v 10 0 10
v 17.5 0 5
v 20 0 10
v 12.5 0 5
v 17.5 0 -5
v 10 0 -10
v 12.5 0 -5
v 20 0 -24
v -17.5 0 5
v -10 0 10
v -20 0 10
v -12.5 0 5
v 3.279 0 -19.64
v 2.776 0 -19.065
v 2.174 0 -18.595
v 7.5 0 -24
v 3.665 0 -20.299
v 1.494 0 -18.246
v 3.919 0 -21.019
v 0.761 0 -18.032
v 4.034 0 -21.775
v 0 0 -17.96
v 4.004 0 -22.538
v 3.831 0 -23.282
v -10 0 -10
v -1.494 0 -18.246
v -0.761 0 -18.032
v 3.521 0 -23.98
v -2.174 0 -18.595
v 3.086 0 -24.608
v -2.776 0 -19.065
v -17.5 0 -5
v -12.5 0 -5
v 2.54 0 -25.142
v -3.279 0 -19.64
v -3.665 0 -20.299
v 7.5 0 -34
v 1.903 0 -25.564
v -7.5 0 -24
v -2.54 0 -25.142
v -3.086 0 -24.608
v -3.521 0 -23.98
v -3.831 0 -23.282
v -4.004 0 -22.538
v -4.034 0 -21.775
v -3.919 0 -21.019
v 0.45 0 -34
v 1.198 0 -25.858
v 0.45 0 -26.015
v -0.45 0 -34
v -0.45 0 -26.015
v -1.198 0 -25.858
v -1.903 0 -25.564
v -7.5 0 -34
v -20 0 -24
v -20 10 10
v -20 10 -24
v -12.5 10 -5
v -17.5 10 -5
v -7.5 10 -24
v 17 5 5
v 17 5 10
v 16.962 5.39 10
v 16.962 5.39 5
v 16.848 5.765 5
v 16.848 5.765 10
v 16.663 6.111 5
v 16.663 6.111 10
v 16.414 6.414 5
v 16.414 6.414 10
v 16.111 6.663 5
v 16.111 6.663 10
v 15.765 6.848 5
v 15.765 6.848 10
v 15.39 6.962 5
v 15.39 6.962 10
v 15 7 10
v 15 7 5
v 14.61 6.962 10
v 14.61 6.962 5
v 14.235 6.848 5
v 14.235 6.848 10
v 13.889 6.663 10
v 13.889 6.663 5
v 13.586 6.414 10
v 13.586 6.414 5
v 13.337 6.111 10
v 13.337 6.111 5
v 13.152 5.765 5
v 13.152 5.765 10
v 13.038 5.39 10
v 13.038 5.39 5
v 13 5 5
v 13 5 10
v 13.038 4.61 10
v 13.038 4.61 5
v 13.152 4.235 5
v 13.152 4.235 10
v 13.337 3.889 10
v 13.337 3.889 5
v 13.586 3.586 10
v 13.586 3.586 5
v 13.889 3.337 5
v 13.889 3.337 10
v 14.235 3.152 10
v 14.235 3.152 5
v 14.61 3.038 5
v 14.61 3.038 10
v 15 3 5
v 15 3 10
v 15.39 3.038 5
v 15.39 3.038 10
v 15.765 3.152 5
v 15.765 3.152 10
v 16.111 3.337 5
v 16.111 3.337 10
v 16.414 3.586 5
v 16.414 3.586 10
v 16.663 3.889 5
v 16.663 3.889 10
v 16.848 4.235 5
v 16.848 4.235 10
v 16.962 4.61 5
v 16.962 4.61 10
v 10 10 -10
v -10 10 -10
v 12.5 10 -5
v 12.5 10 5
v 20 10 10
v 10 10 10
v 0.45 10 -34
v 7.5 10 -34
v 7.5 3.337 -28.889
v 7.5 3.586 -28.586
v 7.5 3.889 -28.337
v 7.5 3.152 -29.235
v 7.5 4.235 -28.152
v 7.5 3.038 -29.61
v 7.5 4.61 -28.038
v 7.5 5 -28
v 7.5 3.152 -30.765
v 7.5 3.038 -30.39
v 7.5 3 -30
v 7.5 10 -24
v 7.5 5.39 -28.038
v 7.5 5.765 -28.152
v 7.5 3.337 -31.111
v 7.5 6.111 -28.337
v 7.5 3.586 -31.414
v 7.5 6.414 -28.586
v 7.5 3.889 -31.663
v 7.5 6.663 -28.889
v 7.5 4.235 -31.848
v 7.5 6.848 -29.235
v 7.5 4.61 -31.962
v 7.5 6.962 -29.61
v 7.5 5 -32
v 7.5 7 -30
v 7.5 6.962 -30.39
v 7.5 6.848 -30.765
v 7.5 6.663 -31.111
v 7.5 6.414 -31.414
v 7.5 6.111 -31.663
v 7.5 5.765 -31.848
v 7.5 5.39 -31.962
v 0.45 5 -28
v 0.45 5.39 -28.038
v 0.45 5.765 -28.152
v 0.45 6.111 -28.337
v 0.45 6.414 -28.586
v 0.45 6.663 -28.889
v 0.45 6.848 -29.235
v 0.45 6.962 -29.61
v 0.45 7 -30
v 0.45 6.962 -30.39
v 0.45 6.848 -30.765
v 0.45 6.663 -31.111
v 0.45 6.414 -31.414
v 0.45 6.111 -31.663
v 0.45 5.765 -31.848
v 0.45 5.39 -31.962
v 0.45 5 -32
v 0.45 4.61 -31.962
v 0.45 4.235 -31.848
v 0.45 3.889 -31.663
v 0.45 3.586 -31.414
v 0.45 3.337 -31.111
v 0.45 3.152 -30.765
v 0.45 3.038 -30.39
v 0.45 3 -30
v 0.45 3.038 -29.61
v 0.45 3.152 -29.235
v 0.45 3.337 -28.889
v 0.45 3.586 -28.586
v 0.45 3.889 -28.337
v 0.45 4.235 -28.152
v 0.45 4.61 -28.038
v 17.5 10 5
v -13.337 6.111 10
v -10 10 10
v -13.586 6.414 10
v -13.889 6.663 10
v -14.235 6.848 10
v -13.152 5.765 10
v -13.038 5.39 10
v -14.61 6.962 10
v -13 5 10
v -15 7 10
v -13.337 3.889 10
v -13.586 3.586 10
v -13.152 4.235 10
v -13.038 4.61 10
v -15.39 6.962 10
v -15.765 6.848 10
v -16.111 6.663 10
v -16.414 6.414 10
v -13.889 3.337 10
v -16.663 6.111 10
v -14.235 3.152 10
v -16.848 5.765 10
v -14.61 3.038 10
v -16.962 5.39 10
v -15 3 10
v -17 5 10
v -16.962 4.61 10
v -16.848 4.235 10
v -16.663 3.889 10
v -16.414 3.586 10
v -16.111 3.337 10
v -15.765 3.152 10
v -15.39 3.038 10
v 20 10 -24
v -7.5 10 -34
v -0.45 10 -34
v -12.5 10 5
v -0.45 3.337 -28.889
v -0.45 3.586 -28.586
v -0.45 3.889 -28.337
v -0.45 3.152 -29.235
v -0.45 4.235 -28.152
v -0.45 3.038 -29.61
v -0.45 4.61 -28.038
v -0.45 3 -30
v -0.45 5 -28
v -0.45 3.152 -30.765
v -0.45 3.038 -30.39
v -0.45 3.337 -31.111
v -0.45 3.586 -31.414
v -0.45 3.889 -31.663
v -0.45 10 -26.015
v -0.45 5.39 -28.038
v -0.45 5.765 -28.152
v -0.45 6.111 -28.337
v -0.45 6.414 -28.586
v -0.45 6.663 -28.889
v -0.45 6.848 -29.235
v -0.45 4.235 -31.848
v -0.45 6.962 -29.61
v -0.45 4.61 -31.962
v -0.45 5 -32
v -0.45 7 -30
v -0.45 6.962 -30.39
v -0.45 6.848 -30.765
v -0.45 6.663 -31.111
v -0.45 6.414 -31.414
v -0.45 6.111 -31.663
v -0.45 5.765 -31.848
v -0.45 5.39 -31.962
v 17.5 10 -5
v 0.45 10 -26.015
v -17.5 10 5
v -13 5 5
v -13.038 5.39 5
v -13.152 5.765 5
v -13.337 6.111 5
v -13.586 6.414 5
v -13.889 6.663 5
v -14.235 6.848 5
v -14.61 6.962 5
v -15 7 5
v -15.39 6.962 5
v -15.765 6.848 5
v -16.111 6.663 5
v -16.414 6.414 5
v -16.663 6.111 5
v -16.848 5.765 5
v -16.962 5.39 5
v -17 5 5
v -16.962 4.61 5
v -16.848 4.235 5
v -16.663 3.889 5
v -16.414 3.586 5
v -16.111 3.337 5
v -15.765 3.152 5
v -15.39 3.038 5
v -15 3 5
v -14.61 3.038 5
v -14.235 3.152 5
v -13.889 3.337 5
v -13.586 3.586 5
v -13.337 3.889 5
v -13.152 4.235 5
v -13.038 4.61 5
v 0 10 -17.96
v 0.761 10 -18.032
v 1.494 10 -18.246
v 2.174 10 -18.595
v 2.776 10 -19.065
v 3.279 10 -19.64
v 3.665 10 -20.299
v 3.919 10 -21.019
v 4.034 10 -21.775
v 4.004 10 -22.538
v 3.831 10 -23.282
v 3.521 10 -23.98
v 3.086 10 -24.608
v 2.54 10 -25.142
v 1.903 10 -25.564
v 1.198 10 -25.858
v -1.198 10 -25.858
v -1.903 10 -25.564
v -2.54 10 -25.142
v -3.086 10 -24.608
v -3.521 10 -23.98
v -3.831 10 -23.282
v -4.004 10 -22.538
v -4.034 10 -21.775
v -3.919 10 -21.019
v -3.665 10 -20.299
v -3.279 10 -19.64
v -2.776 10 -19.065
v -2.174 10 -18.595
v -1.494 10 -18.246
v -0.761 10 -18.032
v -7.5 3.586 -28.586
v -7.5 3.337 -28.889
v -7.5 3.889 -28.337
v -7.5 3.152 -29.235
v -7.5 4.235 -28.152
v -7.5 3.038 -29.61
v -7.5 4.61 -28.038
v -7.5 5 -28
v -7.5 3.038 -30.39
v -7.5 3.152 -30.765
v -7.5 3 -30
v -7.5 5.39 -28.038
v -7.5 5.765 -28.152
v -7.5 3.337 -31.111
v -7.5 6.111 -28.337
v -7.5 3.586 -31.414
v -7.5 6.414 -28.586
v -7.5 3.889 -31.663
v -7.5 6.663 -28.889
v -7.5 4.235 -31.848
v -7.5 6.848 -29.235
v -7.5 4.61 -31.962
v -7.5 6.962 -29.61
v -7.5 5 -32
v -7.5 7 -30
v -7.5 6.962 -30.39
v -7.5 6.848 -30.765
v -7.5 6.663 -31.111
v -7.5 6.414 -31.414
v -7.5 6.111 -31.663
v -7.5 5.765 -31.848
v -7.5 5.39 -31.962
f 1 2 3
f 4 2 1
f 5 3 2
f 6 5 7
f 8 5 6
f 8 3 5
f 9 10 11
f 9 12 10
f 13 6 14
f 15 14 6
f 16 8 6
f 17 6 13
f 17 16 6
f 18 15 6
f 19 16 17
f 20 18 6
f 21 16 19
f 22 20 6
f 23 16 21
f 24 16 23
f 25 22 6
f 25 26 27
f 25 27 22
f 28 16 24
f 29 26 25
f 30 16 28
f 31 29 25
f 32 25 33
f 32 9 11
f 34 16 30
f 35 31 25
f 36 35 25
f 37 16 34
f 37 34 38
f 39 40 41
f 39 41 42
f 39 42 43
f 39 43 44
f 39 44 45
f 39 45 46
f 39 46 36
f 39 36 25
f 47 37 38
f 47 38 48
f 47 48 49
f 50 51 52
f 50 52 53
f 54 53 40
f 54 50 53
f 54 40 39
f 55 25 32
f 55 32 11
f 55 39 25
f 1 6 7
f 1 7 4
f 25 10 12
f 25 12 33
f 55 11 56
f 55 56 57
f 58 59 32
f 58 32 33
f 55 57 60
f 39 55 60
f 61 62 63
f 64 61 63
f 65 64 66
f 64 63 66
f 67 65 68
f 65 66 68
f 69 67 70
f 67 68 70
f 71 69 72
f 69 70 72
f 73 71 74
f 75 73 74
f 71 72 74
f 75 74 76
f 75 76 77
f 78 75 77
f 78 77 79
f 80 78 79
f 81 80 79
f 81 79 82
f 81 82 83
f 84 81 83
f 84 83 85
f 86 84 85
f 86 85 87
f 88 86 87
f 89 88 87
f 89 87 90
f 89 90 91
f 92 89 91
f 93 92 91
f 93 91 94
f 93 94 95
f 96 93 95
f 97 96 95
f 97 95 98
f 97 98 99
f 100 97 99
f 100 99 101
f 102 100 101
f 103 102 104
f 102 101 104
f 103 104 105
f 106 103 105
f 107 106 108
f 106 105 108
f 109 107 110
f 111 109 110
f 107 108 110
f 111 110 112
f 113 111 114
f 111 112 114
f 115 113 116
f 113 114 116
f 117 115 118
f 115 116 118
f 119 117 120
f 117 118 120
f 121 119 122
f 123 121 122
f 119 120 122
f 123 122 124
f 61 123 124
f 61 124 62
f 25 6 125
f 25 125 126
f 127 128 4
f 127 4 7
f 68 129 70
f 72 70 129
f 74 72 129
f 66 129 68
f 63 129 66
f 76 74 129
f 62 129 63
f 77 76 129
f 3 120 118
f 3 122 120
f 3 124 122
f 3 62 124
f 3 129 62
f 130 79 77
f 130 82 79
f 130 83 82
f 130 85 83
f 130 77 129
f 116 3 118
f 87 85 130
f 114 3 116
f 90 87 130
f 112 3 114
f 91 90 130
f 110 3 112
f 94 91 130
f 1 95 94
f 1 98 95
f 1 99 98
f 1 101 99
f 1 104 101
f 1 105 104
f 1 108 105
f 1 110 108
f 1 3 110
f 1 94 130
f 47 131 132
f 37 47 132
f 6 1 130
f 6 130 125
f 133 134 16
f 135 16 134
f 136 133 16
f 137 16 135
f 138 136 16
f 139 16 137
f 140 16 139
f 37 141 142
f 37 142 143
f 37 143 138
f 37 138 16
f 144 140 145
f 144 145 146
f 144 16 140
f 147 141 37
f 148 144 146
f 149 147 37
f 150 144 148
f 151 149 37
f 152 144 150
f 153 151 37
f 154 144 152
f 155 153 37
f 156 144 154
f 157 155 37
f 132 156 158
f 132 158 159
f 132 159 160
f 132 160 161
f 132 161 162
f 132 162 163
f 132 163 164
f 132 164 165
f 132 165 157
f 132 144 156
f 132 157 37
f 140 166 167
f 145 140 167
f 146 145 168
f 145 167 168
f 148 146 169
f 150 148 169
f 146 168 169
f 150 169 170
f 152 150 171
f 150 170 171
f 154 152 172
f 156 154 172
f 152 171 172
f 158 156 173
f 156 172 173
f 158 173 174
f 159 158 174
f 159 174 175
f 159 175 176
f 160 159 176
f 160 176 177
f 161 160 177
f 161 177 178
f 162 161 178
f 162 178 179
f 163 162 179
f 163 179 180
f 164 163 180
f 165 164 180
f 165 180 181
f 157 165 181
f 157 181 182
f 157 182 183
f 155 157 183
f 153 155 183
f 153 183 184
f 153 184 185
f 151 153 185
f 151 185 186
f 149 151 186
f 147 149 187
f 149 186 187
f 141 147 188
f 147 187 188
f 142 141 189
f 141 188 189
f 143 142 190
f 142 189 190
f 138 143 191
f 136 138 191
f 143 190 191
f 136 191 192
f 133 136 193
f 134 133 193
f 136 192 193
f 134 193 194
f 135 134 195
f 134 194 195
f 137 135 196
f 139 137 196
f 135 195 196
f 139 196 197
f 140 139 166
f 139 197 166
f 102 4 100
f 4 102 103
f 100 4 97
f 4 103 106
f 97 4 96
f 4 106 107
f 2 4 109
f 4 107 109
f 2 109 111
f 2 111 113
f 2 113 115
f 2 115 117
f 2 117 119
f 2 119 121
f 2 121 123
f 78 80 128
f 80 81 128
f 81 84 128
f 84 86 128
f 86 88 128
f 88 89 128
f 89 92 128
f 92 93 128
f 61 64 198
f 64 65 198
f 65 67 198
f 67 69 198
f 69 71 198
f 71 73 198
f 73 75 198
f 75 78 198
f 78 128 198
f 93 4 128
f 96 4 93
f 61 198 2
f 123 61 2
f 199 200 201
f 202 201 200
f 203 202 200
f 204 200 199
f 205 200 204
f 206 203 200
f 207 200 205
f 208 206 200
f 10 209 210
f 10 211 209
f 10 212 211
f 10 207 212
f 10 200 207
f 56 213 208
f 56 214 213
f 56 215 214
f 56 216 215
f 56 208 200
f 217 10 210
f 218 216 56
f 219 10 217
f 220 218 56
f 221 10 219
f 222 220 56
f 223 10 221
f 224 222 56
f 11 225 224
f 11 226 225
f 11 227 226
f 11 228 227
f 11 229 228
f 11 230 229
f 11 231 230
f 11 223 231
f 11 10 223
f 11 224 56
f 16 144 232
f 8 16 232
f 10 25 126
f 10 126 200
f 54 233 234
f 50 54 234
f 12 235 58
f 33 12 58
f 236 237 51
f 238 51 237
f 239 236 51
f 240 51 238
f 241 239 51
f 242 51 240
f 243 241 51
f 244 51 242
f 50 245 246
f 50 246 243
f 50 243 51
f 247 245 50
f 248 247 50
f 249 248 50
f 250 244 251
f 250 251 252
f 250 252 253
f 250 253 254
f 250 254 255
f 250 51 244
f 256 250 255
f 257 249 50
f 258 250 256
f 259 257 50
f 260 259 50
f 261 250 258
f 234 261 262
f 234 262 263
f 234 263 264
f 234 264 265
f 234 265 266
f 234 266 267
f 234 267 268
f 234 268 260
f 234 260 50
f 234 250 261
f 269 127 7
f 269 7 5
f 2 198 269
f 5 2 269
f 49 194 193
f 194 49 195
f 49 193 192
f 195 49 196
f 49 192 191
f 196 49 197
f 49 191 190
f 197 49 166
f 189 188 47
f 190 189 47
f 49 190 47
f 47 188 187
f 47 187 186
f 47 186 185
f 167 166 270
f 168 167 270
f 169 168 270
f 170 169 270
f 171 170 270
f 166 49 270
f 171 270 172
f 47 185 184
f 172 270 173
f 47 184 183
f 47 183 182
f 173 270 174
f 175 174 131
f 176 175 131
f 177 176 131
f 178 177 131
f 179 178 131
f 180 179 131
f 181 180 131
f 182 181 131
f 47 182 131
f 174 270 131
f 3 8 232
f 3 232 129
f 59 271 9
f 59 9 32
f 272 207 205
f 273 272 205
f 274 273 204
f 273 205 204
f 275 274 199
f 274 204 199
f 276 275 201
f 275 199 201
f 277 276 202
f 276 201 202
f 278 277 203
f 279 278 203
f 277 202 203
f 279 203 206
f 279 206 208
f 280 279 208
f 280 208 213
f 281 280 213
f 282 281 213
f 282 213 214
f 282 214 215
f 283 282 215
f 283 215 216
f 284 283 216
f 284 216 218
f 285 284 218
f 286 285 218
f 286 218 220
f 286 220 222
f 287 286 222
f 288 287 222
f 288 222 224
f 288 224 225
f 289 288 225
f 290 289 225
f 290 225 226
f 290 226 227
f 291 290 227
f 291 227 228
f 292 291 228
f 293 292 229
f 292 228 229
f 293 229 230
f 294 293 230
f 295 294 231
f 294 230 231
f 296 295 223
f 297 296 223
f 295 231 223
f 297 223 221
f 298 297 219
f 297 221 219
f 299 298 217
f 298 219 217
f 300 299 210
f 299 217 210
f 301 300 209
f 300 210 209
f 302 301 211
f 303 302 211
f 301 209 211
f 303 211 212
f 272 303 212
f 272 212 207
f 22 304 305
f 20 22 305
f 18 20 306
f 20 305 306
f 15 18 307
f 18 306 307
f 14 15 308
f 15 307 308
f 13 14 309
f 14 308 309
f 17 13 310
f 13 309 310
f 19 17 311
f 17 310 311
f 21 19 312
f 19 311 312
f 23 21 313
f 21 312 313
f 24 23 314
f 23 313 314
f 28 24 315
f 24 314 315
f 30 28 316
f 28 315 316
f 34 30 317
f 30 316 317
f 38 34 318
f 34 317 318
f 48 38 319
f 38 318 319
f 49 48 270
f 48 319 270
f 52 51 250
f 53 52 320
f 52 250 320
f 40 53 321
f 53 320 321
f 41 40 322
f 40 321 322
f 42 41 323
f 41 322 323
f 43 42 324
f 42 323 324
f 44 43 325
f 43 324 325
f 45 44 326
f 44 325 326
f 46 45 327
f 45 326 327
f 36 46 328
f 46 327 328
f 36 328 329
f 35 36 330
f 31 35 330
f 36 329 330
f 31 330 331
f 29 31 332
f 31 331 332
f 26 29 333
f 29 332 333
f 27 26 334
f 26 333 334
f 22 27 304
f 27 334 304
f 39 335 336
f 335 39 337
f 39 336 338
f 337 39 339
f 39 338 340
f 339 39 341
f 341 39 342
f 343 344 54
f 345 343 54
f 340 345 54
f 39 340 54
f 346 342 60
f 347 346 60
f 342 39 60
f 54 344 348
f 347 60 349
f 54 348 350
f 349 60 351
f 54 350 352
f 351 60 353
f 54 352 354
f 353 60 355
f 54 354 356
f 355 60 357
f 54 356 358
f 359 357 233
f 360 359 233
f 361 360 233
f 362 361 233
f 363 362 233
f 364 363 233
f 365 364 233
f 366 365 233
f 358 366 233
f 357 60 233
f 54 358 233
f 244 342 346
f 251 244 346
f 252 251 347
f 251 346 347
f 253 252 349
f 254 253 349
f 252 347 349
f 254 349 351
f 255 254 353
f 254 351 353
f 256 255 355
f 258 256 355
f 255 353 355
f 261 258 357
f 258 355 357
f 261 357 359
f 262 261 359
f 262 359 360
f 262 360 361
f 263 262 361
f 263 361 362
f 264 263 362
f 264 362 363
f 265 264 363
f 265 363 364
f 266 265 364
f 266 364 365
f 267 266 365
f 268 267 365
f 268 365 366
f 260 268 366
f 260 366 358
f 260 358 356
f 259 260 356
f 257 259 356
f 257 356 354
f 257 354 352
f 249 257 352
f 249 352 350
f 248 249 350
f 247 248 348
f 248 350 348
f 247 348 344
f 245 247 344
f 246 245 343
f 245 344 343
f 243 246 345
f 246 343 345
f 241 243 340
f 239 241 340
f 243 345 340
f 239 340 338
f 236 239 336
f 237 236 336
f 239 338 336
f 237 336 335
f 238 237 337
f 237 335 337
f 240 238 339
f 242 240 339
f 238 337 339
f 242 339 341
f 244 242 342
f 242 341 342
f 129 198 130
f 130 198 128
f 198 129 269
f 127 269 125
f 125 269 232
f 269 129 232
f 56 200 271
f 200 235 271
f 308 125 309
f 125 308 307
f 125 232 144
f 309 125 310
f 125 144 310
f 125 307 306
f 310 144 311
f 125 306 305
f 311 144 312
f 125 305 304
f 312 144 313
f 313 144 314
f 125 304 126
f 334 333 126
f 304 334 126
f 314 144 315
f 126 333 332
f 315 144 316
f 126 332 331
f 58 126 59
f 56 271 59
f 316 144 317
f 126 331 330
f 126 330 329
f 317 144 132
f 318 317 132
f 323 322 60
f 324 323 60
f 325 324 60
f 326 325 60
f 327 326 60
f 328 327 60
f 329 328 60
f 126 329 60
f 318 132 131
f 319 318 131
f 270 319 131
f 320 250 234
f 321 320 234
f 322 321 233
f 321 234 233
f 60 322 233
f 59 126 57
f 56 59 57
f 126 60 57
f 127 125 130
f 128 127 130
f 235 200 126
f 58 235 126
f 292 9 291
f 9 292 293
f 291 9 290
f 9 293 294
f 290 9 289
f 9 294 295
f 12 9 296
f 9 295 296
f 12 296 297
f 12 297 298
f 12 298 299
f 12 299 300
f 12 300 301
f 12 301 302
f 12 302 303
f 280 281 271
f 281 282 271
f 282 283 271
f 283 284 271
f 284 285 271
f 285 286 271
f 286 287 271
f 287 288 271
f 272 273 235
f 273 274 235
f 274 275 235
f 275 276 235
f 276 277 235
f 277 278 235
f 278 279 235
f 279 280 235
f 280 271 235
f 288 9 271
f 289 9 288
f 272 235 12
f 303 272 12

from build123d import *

# Parameters (mm, degrees)
BOSS_EXTRUDE1_DEPTH = 10
SKETCH2_R           = 2
CUT_EXTRUDE1_DEPTH  = 15
SKETCH3_R           = 2
CUT_EXTRUDE2_DEPTH  = 11
SKETCH4_W           = 40
SKETCH4_H           = 24
BOSS_EXTRUDE2_DEPTH = 10
SKETCH5_R           = 4.04
CUT_EXTRUDE3_DEPTH  = 41.693979899
SKETCH6_W           = 0.9
SKETCH6_H           = 12
CUT_EXTRUDE4_DEPTH  = 41.693979899
SKETCH8_R           = 2
CUT_EXTRUDE5_DEPTH  = 40
SKETCH9_W           = 12.5
SKETCH9_H           = 10
CUT_EXTRUDE6_DEPTH  = 40
SKETCH10_W          = 5
SKETCH10_H          = 10
CUT_EXTRUDE7_DEPTH  = 10


with BuildPart() as part:
    # Sketch1 → Boss-Extrude1 (new body)
    with BuildSketch(Plane(origin=(0, 0, 0), x_dir=(1, 0, 0), z_dir=(0, 1, 0))):
        Polygon((-20, -10), (-20, 20), (20, 20), (20, -10), (10, -10), (10, 10), (-10, 10), (-10, -10), align=None)
    extrude(amount=BOSS_EXTRUDE1_DEPTH)

    # Sketch2 → Cut-Extrude1 (cut)
    with BuildSketch(Plane.XY.offset(10)):
        with Locations((-15, 5)):
            Circle(SKETCH2_R)
        with Locations((15, 5)):
            Circle(SKETCH2_R)
    extrude(amount=-CUT_EXTRUDE1_DEPTH, mode=Mode.SUBTRACT)

    # Sketch3 → Cut-Extrude2 (cut)
    with BuildSketch(Plane.XY.offset(-10)):
        with Locations((0, 5)):
            Circle(SKETCH3_R)
    extrude(amount=-CUT_EXTRUDE2_DEPTH, mode=Mode.SUBTRACT)

    # Sketch4 → Boss-Extrude2 (add, through all)
    with BuildSketch(Plane(origin=(0, 10, 0), x_dir=(1, 0, 0), z_dir=(0, 1, 0))):
        with Locations((0, 22)):
            Rectangle(SKETCH4_W, SKETCH4_H)
    extrude(amount=-BOSS_EXTRUDE2_DEPTH)

    # Sketch5 → Cut-Extrude3 (cut, through all)
    with BuildSketch(Plane(origin=(0, 10, 0), x_dir=(1, 0, 0), z_dir=(0, 1, 0))):
        with Locations(Location((0, 22, 0), (0, 0, 270))):
            Circle(SKETCH5_R)
    extrude(amount=-CUT_EXTRUDE3_DEPTH, mode=Mode.SUBTRACT)

    # Sketch6 → Cut-Extrude4 (cut, through all)
    with BuildSketch(Plane(origin=(0, 10, 0), x_dir=(1, 0, 0), z_dir=(0, 1, 0))):
        with Locations((0, 28)):
            Rectangle(SKETCH6_W, SKETCH6_H)
    extrude(amount=-CUT_EXTRUDE4_DEPTH, mode=Mode.SUBTRACT)

    # Sketch8 → Cut-Extrude5 (cut)
    with BuildSketch(Plane.ZY.offset(20)):
        with Locations((-30, 5)):
            Circle(SKETCH8_R)
    extrude(amount=-CUT_EXTRUDE5_DEPTH, mode=Mode.SUBTRACT)

    # Sketch9 → Cut-Extrude6 (cut)
    with BuildSketch(Plane(origin=(0, 10, 0), x_dir=(1, 0, 0), z_dir=(0, 1, 0))):
        with Locations((13.75, 29)):
            Rectangle(SKETCH9_W, SKETCH9_H)
        with Locations((-13.75, 29)):
            Rectangle(SKETCH9_W, SKETCH9_H)
    extrude(amount=-CUT_EXTRUDE6_DEPTH, mode=Mode.SUBTRACT)

    # Sketch10 → Cut-Extrude7 (cut)
    with BuildSketch(Plane(origin=(0, 10, 0), x_dir=(1, 0, 0), z_dir=(0, 1, 0))):
        with Locations((-15, 0)):
            Rectangle(SKETCH10_W, SKETCH10_H)
        with Locations((15, 0)):
            Rectangle(SKETCH10_W, SKETCH10_H)
    extrude(amount=-CUT_EXTRUDE7_DEPTH, mode=Mode.SUBTRACT)


solid = part.part
